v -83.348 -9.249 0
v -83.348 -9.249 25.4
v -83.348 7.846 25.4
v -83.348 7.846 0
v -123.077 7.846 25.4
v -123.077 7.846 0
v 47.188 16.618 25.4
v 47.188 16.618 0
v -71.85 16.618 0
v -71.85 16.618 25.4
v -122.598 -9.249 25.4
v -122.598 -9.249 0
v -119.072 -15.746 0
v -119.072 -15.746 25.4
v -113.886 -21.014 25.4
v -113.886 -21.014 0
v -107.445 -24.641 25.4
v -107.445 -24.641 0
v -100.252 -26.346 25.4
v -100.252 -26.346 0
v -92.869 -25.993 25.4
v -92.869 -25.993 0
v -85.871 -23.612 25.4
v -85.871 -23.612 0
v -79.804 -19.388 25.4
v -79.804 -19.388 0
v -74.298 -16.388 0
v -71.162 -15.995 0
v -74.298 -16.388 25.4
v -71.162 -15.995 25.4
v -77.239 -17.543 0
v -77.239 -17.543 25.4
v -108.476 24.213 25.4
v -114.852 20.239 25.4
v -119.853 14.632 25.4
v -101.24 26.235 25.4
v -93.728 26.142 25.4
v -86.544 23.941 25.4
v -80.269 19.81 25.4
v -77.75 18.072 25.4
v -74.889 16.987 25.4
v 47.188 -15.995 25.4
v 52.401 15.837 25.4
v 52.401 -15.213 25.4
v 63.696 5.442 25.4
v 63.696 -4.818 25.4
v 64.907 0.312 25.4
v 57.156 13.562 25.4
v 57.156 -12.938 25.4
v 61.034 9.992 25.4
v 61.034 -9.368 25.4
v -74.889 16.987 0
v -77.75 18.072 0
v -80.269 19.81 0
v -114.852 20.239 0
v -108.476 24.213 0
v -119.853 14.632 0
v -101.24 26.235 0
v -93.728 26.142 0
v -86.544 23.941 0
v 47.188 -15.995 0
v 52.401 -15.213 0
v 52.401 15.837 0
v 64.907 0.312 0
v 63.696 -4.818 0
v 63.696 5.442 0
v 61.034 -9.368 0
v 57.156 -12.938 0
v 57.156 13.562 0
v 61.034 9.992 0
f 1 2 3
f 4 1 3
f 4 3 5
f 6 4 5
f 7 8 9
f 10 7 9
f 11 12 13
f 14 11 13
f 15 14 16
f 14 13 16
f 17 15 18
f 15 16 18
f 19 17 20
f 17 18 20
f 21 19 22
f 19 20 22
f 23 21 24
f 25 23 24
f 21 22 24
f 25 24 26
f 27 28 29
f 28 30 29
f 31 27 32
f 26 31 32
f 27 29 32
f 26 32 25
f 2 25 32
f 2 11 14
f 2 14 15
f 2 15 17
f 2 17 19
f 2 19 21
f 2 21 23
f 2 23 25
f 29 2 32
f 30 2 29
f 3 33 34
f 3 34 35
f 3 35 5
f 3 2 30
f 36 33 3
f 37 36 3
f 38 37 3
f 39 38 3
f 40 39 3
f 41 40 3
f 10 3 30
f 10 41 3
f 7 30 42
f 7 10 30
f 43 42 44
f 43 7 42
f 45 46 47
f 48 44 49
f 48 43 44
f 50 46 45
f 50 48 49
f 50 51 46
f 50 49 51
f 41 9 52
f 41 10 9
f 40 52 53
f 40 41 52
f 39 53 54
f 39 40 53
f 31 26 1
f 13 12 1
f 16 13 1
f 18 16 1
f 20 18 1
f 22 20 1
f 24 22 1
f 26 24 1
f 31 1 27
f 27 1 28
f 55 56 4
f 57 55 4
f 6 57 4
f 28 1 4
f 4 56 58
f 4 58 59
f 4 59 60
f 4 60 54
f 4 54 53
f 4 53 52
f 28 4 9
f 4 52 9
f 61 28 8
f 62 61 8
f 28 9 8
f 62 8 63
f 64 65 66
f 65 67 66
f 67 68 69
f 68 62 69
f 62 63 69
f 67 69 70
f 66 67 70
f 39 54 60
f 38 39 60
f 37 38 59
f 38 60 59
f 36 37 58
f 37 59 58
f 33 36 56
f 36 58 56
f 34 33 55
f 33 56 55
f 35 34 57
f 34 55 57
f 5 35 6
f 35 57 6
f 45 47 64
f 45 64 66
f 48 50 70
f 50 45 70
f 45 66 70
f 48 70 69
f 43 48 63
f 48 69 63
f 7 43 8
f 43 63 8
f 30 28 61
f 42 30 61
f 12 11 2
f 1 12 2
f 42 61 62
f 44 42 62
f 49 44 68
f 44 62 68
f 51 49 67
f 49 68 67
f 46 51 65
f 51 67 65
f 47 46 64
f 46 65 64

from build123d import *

# Parameters (mm, degrees)
F1_DEPTH    = 25.4
F3_DEPTH    = 38.1
F4_R        = 12.7
F5_R        = 12.7
F6_T1_DEPTH = 114.3


# Not quite as in the source:
# - a fillet or chamfer that OpenCascade refuses, or shapes differently, is made with other operations: its cross-section is extruded or revolved along the edge and cut away or added


with BuildPart() as f1:
    # F0 (on Top) → F1 (new body)
    with BuildSketch(Plane.XY):
        with BuildLine():
            Line((-77.2201499837, 16.618498601), (-92.2268889844, 16.618498601))
            Line((-92.2268889844, 16.618498601), (-92.2268889844, -15.9945080916))
            Line((-92.2268889844, -15.9945080916), (-76.7317300981, -15.9945080916))
            ThreePointArc((-76.7317300981, -15.9945080916), (-72.7314875025, -8.4378237077), (-71.3499844152, 0))
            ThreePointArc((-71.3499844152, 0), (-72.8606518933, 8.8123966597), (-77.2201499837, 16.618498601))
        make_face()
        with BuildLine():
            Line((64.9677813053, 16.618498601), (-77.2201499837, 16.618498601))
            ThreePointArc((-77.2201499837, 16.618498601), (-72.8606518933, 8.8123966597), (-71.3499844152, 0))
            ThreePointArc((-71.3499844152, 0), (-72.7314875025, -8.4378237077), (-76.7317300981, -15.9945080916))
            Line((-76.7317300981, -15.9945080916), (64.9677813053, -15.9945080916))
            Line((64.9677813053, -15.9945080916), (64.9677813053, 16.618498601))
        make_face()
        with BuildLine():
            Line((-92.2268889844, -15.9945080916), (-92.2268889844, 16.618498601))
            Line((-92.2268889844, 16.618498601), (-77.2201499837, 16.618498601))
            ThreePointArc((-77.2201499837, 16.618498601), (-124.2643223617, -0.3962064299), (-76.7317300981, -15.9945080916))
            Line((-76.7317300981, -15.9945080916), (-92.2268889844, -15.9945080916))
        make_face()
    extrude(amount=F1_DEPTH)

    # F2 (on face) → F3 (cut)
    with BuildSketch(Plane.XY.offset(25.4)):
        with BuildLine():
            Line((-83.348184824, 7.8462203965), (-123.0771370274, 7.8462203965))
            ThreePointArc((-123.0771370274, 7.8462203965), (-124.2569046236, -0.741220082), (-122.5980357113, -9.2491069809))
            Line((-122.5980357113, -9.2491069809), (-83.348184824, -9.2491069809))
            Line((-83.348184824, -9.2491069809), (-83.348184824, 7.8462203965))
        make_face()
        with BuildLine():
            Line((-123.0771370274, 7.8462203965), (-131.8430900574, 7.8462203965))
            Line((-131.8430900574, 7.8462203965), (-131.8430900574, -9.2491069809))
            Line((-131.8430900574, -9.2491069809), (-122.5980357113, -9.2491069809))
            ThreePointArc((-122.5980357113, -9.2491069809), (-124.2569046236, -0.741220082), (-123.0771370274, 7.8462203965))
        make_face()
    extrude(amount=-F3_DEPTH, mode=Mode.SUBTRACT)

    # F4
    f4_edges = [f1.edges().sort_by_distance(p)[0] for p in [
        (-77.22015, 16.618499, 12.7),
    ]]
    fillet(f4_edges, radius=F4_R)

    # F5
    f5_edges = [f1.edges().sort_by_distance(p)[0] for p in [
        (-76.73173, -15.994508, 12.7),
    ]]
    fillet(f5_edges, radius=F5_R)

    # F6: fillet of radius 17.78 on 2 edges, made by hand

    # F6_s2 → F6_t1 (cut)
    with BuildSketch(Plane.XY.offset(-44.45)):
        with BuildLine():
            ThreePointArc((64.9677813053, -1.161501399), (59.7601398748, 11.4108571705), (47.1877813053, 16.618498601))
            Line((47.1877813053, 16.618498601), (64.9677813053, 16.618498601))
            Line((64.9677813053, 16.618498601), (64.9677813053, -1.161501399))
        make_face()
        with BuildLine():
            ThreePointArc((47.1877813053, -15.9945080916), (59.7601398748, -10.7868666611), (64.9677813053, 1.7854919084))
            Line((64.9677813053, 1.7854919084), (64.9677813053, -15.9945080916))
            Line((64.9677813053, -15.9945080916), (47.1877813053, -15.9945080916))
        make_face()
    extrude(amount=F6_T1_DEPTH, mode=Mode.SUBTRACT)


solid = f1.part
